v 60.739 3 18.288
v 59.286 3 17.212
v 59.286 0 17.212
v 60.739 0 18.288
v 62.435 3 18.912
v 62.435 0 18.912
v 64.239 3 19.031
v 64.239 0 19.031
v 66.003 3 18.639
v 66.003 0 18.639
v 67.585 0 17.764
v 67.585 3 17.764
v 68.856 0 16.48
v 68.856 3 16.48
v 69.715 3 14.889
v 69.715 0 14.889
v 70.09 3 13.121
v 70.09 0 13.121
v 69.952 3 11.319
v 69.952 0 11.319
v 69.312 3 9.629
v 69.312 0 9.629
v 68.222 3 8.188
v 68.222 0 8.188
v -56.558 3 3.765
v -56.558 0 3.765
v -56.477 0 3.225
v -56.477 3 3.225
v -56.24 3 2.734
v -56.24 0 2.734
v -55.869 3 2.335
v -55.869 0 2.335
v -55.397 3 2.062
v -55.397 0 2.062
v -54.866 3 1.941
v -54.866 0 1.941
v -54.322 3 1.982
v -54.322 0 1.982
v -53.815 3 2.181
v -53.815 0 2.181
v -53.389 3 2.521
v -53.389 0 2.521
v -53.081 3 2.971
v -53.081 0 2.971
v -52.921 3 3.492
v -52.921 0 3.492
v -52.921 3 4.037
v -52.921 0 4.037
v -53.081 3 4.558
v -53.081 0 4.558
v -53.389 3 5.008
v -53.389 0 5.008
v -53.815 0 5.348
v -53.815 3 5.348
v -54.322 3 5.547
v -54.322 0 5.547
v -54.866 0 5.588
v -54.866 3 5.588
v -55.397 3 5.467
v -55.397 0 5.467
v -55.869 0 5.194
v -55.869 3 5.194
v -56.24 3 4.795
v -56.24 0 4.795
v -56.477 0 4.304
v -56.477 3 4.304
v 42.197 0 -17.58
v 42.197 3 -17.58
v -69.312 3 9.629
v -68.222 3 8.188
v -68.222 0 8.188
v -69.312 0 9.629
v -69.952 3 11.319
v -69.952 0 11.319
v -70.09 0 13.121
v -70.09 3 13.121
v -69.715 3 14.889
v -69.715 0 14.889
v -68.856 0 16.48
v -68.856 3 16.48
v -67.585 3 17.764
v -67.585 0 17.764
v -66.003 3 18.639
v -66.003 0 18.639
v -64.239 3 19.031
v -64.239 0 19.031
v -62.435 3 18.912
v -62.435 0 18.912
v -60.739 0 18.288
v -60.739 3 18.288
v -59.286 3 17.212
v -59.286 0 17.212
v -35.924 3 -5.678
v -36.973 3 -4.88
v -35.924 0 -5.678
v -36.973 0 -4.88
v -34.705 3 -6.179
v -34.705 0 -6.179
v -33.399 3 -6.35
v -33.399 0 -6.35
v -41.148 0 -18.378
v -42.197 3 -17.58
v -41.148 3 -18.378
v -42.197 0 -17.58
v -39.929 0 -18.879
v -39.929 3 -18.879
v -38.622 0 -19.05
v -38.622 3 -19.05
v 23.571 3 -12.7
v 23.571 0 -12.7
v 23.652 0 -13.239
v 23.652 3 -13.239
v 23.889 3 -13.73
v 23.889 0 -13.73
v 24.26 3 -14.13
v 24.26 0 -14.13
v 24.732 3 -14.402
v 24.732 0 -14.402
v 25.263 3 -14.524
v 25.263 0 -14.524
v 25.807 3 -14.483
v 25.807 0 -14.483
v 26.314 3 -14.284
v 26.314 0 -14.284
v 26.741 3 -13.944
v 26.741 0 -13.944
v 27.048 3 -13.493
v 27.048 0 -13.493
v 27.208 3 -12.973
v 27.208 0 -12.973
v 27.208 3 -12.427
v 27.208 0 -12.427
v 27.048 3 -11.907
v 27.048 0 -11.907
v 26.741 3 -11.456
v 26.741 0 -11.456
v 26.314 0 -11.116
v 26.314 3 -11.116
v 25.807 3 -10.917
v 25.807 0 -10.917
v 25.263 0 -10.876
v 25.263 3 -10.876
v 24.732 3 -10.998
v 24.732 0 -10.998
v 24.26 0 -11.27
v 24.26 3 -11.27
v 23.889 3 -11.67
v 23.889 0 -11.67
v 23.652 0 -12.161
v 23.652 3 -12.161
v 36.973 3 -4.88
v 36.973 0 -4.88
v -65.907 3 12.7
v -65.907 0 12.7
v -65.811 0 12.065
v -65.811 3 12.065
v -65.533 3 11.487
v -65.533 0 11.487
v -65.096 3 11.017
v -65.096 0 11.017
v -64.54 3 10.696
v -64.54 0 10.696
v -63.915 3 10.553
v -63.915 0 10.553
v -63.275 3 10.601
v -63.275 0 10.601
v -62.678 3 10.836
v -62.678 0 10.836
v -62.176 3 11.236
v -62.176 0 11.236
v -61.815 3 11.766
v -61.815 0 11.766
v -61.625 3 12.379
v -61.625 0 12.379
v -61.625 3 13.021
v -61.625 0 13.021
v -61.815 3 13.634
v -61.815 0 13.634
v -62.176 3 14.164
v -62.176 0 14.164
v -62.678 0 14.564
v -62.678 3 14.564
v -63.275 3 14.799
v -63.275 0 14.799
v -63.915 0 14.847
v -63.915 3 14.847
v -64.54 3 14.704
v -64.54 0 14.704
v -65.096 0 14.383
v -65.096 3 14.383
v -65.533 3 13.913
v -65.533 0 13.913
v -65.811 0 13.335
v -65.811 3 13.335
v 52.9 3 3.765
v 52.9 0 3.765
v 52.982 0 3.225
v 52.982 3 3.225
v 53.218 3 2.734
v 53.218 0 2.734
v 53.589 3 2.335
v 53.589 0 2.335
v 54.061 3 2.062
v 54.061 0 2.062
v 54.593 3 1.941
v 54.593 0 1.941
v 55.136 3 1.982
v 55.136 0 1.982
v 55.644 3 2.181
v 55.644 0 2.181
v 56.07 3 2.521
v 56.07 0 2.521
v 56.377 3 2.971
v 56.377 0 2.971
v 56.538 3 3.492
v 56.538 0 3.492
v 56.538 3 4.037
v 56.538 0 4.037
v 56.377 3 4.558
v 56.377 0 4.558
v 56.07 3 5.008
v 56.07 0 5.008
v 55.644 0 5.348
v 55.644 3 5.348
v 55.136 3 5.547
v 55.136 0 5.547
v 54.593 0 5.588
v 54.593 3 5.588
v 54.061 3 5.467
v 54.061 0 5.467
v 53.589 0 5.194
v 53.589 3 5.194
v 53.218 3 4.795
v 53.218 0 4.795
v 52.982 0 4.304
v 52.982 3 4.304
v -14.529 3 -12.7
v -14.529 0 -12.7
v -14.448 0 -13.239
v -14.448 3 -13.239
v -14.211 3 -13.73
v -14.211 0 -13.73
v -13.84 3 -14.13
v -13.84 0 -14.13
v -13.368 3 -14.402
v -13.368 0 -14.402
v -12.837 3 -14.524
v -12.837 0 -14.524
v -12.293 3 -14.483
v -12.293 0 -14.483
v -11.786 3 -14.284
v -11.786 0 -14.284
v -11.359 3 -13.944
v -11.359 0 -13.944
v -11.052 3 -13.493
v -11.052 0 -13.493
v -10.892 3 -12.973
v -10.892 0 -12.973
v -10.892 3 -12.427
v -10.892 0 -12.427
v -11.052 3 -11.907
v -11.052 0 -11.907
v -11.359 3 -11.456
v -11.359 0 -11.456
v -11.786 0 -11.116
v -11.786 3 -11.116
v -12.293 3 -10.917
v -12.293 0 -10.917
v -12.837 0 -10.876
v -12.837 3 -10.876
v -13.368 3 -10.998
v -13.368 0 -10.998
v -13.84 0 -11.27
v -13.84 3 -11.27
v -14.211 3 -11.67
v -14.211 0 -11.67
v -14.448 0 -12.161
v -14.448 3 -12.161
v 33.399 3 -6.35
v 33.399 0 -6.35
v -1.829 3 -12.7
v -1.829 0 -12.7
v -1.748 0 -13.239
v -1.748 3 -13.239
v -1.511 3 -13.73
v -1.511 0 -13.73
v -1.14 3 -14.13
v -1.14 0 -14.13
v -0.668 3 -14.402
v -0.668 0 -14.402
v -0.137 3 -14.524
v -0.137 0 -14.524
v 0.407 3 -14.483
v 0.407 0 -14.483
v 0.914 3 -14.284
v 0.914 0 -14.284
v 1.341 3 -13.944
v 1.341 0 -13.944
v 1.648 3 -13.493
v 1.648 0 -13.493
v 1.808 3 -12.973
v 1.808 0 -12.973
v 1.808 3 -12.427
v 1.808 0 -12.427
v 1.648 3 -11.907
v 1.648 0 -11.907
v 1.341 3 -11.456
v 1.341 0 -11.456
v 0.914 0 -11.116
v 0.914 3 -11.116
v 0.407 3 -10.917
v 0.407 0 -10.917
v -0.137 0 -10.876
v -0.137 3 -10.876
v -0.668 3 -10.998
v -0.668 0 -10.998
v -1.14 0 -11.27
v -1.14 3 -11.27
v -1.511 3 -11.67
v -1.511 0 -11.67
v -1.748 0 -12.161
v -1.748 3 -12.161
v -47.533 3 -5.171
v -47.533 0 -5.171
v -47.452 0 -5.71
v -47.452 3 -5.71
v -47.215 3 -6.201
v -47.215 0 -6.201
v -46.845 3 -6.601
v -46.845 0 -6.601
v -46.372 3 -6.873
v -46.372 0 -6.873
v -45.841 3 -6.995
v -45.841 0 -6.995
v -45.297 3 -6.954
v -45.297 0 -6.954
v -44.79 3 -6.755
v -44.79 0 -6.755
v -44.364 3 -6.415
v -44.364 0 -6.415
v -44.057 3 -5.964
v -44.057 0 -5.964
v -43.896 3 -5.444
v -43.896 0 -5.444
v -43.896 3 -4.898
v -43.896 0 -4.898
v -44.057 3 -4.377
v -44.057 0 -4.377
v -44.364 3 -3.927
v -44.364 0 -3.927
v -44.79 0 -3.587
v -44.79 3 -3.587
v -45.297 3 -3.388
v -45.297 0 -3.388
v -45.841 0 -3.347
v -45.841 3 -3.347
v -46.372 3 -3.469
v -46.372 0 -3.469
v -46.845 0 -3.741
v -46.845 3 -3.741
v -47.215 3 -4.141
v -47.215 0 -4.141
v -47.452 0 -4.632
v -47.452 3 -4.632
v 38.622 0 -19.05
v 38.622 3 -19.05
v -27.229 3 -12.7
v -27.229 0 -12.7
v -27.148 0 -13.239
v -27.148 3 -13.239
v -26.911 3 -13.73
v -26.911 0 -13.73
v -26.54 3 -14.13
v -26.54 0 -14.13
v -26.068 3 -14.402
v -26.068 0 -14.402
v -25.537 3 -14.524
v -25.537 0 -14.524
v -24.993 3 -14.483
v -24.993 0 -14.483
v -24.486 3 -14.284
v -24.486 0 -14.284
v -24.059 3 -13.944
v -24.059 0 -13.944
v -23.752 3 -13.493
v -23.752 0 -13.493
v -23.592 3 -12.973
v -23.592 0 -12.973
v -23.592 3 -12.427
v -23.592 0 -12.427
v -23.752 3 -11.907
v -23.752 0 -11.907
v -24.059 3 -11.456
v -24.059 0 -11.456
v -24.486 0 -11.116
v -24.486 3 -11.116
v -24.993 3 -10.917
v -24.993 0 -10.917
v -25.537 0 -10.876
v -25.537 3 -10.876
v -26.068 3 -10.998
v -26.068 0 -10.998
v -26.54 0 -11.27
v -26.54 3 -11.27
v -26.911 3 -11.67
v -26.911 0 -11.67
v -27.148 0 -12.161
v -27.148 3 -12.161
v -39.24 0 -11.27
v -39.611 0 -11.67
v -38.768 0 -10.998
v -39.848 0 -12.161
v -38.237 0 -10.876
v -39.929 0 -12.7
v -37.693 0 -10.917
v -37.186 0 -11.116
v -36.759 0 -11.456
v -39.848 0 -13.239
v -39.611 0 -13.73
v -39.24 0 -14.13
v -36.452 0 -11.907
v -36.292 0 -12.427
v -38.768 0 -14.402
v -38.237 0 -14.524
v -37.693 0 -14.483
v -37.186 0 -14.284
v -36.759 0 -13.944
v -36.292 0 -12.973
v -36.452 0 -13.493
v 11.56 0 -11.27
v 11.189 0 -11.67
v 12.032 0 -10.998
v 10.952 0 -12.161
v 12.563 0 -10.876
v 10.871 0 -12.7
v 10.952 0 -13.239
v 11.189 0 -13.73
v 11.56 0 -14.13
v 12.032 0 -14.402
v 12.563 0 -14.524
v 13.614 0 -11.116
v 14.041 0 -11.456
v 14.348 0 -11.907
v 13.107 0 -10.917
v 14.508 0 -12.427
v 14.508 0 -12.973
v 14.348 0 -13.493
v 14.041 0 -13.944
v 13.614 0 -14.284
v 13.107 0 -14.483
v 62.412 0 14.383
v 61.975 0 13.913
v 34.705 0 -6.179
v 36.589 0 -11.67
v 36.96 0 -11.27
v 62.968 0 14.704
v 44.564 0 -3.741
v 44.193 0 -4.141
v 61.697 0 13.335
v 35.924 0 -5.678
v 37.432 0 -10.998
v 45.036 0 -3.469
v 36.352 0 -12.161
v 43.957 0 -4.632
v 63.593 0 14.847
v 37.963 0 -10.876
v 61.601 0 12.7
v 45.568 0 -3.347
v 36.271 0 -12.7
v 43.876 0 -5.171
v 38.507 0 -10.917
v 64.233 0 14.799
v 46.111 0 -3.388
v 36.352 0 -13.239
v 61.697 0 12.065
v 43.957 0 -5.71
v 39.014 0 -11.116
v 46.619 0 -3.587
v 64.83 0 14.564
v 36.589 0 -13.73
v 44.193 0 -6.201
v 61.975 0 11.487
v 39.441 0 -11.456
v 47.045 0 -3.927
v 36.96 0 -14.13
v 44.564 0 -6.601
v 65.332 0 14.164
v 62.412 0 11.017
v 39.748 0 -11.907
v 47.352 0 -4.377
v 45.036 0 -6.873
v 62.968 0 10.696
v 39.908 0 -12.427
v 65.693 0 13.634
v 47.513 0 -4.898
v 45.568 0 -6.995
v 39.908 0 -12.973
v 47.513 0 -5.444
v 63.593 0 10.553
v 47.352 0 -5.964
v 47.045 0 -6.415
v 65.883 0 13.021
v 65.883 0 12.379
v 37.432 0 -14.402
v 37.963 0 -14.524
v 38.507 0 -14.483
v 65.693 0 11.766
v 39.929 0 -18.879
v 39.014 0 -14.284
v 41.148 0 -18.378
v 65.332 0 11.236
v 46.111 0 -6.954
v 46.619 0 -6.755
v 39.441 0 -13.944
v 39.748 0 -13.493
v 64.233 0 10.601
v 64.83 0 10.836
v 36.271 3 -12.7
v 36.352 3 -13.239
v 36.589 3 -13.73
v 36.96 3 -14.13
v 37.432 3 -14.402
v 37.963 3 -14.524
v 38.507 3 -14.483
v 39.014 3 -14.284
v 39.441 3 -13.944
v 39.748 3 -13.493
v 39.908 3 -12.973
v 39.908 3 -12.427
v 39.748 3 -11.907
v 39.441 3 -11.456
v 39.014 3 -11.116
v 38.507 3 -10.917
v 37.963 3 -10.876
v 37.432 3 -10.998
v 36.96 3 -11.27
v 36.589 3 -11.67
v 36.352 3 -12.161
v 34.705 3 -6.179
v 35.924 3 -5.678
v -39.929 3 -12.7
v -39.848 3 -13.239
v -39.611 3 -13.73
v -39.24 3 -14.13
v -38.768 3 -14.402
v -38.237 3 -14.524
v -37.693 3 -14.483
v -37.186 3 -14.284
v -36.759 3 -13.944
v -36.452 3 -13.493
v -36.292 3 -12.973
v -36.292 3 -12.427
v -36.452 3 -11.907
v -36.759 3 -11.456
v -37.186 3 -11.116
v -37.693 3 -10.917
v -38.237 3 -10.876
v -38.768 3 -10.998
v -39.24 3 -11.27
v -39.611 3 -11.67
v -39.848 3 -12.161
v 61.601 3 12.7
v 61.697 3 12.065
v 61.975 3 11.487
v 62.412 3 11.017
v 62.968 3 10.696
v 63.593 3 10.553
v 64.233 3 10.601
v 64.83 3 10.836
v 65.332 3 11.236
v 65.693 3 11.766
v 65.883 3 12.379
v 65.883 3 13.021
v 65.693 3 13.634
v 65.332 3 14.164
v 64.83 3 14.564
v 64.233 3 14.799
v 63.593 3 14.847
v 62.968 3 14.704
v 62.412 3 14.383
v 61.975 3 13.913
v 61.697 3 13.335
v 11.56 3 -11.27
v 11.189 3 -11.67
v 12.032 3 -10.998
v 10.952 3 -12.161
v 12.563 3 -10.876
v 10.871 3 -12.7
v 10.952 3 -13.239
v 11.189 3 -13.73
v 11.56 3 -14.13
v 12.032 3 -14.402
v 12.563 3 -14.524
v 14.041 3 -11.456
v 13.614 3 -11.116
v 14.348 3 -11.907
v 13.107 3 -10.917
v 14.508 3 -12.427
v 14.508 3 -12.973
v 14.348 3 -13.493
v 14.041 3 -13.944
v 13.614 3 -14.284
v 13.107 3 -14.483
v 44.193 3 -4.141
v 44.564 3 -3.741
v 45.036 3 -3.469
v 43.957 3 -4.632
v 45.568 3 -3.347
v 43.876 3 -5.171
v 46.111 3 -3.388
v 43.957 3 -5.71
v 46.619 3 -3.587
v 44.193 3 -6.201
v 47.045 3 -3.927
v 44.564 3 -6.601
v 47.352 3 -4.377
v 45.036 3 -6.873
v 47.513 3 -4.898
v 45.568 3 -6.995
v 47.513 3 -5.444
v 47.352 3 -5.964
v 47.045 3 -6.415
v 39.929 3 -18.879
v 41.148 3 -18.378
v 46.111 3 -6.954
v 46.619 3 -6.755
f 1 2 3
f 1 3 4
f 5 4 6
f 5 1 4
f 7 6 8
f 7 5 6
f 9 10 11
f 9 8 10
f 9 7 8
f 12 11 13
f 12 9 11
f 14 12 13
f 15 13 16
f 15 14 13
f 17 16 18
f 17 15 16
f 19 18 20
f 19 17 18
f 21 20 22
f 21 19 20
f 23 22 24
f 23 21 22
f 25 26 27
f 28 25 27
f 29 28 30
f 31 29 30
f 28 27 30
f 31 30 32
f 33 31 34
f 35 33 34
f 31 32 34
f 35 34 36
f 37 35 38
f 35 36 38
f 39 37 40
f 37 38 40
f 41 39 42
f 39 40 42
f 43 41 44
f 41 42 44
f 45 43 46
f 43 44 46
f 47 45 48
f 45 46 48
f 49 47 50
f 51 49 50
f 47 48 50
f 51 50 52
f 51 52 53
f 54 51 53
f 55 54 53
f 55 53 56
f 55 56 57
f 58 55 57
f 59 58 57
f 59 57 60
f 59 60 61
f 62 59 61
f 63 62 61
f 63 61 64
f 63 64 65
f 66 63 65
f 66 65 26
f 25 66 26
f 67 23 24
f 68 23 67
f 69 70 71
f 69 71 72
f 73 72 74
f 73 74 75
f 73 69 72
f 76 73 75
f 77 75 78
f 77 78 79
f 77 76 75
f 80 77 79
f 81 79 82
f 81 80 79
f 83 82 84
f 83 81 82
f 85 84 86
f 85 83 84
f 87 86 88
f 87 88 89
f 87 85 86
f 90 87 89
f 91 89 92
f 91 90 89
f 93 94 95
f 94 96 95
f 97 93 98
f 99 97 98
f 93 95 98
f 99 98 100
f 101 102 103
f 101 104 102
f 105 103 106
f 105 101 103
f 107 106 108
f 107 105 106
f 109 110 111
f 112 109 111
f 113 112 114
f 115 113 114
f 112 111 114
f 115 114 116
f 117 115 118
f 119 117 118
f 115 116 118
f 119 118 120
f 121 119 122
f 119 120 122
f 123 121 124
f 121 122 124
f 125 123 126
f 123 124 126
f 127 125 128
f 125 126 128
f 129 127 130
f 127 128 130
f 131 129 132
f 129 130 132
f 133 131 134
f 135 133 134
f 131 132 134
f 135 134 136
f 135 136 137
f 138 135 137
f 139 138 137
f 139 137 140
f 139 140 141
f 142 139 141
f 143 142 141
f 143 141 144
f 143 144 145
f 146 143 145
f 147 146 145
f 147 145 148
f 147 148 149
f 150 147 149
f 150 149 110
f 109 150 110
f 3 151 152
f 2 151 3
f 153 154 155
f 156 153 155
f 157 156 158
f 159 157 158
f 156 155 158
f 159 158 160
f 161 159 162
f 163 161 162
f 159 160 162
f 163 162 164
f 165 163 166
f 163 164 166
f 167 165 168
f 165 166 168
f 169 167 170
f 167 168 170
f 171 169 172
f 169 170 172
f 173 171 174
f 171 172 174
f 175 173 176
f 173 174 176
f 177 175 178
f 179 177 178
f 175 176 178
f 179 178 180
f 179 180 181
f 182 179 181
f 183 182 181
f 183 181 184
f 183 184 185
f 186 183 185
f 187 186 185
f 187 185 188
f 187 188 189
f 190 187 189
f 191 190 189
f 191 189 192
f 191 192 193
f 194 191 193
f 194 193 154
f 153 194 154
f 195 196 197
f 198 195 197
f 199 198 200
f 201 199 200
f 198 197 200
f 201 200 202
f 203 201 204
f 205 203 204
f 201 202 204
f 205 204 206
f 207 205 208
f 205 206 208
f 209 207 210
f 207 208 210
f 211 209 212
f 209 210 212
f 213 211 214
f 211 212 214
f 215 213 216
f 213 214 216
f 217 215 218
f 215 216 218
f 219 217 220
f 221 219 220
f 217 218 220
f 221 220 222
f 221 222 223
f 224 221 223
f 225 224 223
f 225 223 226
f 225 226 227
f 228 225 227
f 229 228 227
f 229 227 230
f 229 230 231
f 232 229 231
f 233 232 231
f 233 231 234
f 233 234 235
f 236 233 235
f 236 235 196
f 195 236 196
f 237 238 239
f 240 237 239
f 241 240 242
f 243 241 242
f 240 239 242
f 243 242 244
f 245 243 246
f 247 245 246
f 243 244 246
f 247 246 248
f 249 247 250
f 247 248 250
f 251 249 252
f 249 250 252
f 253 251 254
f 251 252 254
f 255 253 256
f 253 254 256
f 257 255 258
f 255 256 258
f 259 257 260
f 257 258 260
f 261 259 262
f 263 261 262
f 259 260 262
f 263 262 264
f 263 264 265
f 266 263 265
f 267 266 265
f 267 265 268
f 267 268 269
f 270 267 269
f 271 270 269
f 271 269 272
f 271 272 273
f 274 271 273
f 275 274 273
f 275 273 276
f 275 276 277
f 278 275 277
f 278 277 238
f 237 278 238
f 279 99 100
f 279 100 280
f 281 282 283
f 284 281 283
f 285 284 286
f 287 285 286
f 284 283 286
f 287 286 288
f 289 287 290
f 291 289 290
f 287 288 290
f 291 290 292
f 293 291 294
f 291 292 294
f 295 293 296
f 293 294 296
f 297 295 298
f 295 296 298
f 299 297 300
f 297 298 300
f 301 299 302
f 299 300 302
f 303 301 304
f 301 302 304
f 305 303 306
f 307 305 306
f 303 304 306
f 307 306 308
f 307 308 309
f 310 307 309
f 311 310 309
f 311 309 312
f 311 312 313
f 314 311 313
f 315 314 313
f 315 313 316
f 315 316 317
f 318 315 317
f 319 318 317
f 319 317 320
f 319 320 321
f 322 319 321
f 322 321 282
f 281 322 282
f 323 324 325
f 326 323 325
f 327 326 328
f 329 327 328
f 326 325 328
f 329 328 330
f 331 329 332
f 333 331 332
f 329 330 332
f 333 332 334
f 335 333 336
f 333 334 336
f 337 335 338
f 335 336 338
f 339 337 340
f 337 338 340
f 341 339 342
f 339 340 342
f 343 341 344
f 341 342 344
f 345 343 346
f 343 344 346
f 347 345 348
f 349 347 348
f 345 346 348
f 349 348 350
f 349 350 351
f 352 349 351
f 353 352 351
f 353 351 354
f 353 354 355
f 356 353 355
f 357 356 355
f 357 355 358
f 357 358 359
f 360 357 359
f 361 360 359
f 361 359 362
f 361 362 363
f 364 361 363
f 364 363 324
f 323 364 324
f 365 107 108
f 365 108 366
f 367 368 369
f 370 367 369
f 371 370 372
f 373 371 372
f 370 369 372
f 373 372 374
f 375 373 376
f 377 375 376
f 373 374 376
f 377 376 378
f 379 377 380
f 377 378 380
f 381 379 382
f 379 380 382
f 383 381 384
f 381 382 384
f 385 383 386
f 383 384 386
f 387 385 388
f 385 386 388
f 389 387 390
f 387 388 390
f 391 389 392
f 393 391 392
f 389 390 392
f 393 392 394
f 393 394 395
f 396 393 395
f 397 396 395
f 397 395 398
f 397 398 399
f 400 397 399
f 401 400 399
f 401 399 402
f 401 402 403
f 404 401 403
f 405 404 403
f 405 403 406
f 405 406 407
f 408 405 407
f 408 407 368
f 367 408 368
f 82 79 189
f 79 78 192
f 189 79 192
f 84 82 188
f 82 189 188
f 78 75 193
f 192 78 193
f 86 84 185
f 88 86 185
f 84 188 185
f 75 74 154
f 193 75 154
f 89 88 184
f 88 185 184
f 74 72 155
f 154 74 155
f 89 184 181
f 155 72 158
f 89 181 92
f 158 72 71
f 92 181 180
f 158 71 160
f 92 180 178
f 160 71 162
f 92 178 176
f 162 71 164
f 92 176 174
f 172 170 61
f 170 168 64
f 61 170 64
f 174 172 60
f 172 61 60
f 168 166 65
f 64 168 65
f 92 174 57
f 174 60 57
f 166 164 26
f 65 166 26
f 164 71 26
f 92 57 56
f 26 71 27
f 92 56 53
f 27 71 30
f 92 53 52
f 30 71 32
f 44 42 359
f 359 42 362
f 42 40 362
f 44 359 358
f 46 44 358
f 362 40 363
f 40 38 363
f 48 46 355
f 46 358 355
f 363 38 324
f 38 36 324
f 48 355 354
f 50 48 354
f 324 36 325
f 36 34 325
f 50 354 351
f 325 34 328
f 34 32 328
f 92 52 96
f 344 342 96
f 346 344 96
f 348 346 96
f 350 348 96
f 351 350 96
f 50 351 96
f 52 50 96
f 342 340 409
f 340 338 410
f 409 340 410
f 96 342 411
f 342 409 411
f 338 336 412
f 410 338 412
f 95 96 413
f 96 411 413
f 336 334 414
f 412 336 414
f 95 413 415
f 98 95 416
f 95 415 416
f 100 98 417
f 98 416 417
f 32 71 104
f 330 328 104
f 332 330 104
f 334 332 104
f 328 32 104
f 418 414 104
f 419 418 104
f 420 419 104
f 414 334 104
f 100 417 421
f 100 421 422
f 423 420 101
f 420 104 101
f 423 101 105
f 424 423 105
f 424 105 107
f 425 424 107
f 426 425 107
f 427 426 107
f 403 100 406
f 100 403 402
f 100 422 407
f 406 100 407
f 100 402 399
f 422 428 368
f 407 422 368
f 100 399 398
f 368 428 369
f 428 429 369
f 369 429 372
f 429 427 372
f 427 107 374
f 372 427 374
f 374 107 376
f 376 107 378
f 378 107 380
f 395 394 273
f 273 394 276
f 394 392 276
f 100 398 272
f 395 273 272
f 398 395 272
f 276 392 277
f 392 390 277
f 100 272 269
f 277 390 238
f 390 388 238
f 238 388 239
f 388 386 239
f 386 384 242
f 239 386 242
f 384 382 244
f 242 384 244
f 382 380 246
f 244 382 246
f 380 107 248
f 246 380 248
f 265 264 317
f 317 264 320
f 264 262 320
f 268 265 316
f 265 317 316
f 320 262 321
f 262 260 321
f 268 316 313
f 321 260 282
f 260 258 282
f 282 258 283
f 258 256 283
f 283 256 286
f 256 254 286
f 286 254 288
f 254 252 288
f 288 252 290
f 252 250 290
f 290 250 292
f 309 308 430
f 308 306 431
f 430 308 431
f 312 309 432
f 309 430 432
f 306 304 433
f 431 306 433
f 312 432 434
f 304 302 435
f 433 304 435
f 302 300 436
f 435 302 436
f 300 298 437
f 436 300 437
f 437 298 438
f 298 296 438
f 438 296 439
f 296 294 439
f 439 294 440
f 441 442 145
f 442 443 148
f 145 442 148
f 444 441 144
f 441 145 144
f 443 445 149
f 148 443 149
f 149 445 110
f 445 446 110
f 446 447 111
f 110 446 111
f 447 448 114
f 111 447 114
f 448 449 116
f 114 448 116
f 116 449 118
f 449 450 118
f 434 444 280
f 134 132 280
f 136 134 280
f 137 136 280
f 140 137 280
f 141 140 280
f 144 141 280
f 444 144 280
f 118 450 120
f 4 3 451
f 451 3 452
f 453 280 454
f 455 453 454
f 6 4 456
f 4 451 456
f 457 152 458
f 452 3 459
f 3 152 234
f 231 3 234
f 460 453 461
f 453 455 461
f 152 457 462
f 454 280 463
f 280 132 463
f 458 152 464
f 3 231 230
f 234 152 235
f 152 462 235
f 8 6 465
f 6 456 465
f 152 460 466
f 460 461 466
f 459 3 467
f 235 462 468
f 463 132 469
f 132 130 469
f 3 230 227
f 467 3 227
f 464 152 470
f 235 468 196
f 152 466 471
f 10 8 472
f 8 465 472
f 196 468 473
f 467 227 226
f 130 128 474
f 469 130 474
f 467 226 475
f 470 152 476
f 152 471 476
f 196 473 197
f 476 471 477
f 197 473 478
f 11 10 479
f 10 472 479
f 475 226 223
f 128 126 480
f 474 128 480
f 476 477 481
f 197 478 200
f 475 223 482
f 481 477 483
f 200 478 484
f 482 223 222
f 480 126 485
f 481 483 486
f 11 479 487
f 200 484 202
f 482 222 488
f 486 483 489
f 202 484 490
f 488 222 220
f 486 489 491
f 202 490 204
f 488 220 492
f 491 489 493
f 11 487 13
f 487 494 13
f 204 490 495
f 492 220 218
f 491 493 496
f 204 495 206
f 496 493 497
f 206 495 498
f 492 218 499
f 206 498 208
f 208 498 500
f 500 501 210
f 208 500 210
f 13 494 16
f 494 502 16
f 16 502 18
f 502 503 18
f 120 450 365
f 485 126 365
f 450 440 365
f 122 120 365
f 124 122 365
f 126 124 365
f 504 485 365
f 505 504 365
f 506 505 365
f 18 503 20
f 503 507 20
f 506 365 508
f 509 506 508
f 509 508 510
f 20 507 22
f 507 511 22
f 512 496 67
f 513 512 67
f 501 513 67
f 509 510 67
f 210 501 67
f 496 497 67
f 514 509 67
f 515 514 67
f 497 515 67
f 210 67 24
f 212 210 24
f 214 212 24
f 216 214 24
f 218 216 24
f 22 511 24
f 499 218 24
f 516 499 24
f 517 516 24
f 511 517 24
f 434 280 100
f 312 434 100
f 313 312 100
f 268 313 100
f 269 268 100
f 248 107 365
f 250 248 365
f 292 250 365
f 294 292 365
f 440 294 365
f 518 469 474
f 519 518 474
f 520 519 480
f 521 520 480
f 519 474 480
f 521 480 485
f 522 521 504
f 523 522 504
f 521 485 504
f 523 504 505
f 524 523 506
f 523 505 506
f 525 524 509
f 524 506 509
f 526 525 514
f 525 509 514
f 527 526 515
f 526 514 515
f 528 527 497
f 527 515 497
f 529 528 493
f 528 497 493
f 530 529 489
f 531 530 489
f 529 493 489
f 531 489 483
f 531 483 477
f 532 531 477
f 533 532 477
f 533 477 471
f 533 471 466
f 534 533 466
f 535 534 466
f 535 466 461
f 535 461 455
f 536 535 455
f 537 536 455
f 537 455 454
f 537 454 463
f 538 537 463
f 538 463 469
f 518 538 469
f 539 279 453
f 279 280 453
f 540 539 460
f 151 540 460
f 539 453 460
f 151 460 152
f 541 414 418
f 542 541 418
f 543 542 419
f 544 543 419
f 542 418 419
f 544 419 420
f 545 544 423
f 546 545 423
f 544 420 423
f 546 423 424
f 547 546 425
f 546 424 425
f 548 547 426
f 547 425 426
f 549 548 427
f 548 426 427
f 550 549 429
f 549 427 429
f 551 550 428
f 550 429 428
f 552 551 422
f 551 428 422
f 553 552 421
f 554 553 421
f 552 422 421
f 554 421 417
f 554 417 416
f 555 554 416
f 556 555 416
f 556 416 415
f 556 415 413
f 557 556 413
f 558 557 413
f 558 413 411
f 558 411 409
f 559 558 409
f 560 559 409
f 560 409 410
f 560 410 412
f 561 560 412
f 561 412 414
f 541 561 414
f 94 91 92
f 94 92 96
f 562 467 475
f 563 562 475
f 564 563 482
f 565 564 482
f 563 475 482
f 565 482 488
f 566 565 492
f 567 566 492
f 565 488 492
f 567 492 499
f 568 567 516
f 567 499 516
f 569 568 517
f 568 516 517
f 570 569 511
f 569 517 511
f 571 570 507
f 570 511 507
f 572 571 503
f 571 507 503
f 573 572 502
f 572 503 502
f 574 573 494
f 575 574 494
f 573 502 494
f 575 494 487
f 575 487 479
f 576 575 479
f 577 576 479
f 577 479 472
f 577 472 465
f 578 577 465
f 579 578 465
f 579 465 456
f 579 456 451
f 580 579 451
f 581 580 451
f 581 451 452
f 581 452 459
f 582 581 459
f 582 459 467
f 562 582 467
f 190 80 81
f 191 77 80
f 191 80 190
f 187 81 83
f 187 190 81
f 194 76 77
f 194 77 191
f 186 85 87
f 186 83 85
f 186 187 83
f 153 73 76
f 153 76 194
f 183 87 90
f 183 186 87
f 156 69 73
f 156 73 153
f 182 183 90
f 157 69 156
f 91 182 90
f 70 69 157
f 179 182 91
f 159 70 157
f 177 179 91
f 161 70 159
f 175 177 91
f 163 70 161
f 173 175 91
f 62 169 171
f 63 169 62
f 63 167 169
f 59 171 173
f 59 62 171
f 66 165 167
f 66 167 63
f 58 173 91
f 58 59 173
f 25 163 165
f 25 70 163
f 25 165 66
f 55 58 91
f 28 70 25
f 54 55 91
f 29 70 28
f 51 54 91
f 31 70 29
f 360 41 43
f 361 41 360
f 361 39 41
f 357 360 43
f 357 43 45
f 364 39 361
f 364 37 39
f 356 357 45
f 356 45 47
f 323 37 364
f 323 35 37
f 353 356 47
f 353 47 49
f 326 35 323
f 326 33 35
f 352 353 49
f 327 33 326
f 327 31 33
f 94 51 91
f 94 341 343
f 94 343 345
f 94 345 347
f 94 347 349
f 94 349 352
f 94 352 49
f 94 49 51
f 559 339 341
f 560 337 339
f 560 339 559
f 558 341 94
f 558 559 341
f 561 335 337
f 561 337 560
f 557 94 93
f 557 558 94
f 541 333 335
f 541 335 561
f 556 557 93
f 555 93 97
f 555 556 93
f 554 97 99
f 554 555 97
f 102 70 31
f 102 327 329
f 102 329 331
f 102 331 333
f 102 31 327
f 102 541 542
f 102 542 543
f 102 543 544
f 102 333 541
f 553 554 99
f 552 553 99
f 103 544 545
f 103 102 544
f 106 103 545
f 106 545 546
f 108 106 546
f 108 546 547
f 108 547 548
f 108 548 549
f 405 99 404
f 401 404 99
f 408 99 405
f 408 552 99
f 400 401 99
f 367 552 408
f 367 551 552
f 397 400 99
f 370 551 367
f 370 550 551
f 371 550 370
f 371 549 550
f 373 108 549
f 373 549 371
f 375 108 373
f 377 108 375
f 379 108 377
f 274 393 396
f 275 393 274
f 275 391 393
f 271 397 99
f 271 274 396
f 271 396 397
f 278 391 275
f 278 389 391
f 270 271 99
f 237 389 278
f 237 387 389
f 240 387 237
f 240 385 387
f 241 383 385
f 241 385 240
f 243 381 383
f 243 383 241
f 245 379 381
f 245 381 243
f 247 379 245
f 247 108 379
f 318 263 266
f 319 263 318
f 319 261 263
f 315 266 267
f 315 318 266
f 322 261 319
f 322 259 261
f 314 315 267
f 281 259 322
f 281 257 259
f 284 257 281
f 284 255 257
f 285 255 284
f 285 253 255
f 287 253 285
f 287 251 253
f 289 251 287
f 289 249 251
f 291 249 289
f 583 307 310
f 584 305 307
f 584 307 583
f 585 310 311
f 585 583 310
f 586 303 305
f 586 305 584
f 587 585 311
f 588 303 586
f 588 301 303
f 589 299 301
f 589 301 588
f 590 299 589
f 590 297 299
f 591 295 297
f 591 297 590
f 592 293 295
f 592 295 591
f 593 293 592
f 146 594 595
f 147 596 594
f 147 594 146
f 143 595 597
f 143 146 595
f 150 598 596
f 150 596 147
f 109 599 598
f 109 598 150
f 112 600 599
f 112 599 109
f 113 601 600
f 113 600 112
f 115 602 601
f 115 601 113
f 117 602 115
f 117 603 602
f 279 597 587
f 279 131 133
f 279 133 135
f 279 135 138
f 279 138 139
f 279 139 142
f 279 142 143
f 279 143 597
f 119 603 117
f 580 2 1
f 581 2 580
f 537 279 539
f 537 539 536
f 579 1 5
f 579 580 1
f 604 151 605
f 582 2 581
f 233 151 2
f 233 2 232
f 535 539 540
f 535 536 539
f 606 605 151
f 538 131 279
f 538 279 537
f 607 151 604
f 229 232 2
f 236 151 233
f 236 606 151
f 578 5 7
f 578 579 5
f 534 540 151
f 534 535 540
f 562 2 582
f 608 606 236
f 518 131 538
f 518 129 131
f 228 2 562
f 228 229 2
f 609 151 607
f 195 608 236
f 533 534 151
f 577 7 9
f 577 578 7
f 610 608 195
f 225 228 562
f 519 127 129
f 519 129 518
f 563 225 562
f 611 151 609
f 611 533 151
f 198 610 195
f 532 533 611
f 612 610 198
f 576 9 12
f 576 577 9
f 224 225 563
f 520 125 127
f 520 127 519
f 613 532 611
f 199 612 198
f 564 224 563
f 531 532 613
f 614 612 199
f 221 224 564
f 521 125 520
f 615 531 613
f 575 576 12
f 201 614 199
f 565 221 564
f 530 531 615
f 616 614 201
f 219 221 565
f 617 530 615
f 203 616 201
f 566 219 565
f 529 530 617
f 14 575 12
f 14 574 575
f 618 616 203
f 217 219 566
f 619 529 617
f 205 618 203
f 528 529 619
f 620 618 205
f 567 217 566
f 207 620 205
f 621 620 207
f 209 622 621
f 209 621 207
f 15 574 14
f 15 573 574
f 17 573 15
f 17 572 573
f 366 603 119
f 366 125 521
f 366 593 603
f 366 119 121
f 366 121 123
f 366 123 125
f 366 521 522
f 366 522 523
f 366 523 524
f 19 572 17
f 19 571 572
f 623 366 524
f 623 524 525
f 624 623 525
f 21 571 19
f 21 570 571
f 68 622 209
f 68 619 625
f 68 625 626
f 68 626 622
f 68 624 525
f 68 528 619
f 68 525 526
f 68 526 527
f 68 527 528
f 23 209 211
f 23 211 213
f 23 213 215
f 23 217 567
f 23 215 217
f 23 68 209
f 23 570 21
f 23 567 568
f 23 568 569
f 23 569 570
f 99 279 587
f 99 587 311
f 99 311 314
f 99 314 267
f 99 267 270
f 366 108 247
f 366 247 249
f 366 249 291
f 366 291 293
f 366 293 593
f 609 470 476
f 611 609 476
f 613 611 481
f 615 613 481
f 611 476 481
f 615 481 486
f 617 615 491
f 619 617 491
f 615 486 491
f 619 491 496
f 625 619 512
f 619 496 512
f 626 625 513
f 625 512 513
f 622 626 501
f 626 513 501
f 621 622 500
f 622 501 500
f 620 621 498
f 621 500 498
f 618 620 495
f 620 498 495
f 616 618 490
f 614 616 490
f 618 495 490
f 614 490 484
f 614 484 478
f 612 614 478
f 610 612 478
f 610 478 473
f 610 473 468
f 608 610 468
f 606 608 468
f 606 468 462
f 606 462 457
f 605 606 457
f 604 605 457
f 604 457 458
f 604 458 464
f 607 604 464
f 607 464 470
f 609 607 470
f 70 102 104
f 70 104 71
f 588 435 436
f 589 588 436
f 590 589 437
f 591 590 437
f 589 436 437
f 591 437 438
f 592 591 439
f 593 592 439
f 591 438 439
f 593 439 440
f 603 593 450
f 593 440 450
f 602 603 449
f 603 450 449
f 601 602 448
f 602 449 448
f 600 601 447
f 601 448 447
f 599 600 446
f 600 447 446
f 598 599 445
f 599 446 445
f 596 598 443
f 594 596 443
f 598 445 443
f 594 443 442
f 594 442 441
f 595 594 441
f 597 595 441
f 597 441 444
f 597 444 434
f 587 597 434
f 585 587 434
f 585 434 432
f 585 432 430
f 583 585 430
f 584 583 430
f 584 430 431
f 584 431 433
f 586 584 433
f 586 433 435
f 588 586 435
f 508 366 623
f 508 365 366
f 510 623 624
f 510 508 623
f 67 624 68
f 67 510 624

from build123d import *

# Parameters (mm, degrees)
SKETCH1_W             = 140.208
SKETCH1_H             = 38.1
BOSS_EXTRUDE1_DEPTH   = 3
SKETCH2_OUTSIDE_W     = 171.272
SKETCH2_OUTSIDE_H     = 69.164
CUT_EXTRUDE1_DEPTH    = 73.708137894
F_8_CLEARANCE_HOLE1_D = 4.3053
F_6_CLEARANCE_HOLE1_D = 3.6576
FILLET1_R             = 5.08


with BuildPart() as part:
    # Sketch1 → Boss-Extrude1 (new body)
    with BuildSketch(Plane(origin=(0, 0, 0), x_dir=(1, 0, 0), z_dir=(0, 1, 0))):
        Rectangle(SKETCH1_W, SKETCH1_H)
    extrude(amount=BOSS_EXTRUDE1_DEPTH)

    # Sketch2 outside → Cut-Extrude1 (cut, through all)
    with BuildSketch(Plane(origin=(0, 3, 0), x_dir=(1, 0, 0), z_dir=(0, 1, 0))):
        Rectangle(SKETCH2_OUTSIDE_W, SKETCH2_OUTSIDE_H)
        with BuildLine():
            Line((-59.286266177, -17.212411161), (-35.488230904, 6.35))
            Line((-35.488230904, 6.35), (35.488230904, 6.35))
            Line((35.488230904, 6.35), (59.286266177, -17.212411161))
            ThreePointArc((59.286266177, -17.212411161), (68.266411161, -17.167733823), (68.221733823, -8.187588839))
            Line((68.221733823, -8.187588839), (40.711769096, 19.05))
            Line((40.711769096, 19.05), (-40.711769096, 19.05))
            Line((-40.711769096, 19.05), (-68.221733823, -8.187588839))
            ThreePointArc((-68.221733823, -8.187588839), (-68.266411161, -17.167733823), (-59.286266177, -17.212411161))
        make_face(mode=Mode.SUBTRACT)
    extrude(amount=-CUT_EXTRUDE1_DEPTH, mode=Mode.SUBTRACT)

    # #8 Clearance Hole1 (through all)
    with Locations(Plane(origin=(0, 3, 0), x_dir=(1, 0, 0), z_dir=(0, 1, 0))):
        with Locations((-63.754, -12.7), (63.754, -12.7)):
            Hole(F_8_CLEARANCE_HOLE1_D / 2)

    # #6 Clearance Hole1 (through all)
    with Locations(Plane(origin=(0, 3, 0), x_dir=(1, 0, 0), z_dir=(0, 1, 0))):
        with Locations((-54.729177678, -3.764532354), (-45.704355355, 5.170935292), (-38.1, 12.7), (0, 12.7), (38.1, 12.7), (45.704355355, 5.170935292), (54.729177678, -3.764532354), (-25.4, 12.7), (-12.7, 12.7), (12.7, 12.7), (25.4, 12.7)):
            Hole(F_6_CLEARANCE_HOLE1_D / 2)

    # Fillet1
    fillet1_edges = [part.edges().sort_by_distance(p)[0] for p in [
        (-40.711769096, 1.5, -19.05),
        (40.711769096, 1.5, -19.05),
        (35.488230904, 1.5, -6.35),
        (-35.488230904, 1.5, -6.35),
    ]]
    fillet(fillet1_edges, radius=FILLET1_R)


solid = part.part
